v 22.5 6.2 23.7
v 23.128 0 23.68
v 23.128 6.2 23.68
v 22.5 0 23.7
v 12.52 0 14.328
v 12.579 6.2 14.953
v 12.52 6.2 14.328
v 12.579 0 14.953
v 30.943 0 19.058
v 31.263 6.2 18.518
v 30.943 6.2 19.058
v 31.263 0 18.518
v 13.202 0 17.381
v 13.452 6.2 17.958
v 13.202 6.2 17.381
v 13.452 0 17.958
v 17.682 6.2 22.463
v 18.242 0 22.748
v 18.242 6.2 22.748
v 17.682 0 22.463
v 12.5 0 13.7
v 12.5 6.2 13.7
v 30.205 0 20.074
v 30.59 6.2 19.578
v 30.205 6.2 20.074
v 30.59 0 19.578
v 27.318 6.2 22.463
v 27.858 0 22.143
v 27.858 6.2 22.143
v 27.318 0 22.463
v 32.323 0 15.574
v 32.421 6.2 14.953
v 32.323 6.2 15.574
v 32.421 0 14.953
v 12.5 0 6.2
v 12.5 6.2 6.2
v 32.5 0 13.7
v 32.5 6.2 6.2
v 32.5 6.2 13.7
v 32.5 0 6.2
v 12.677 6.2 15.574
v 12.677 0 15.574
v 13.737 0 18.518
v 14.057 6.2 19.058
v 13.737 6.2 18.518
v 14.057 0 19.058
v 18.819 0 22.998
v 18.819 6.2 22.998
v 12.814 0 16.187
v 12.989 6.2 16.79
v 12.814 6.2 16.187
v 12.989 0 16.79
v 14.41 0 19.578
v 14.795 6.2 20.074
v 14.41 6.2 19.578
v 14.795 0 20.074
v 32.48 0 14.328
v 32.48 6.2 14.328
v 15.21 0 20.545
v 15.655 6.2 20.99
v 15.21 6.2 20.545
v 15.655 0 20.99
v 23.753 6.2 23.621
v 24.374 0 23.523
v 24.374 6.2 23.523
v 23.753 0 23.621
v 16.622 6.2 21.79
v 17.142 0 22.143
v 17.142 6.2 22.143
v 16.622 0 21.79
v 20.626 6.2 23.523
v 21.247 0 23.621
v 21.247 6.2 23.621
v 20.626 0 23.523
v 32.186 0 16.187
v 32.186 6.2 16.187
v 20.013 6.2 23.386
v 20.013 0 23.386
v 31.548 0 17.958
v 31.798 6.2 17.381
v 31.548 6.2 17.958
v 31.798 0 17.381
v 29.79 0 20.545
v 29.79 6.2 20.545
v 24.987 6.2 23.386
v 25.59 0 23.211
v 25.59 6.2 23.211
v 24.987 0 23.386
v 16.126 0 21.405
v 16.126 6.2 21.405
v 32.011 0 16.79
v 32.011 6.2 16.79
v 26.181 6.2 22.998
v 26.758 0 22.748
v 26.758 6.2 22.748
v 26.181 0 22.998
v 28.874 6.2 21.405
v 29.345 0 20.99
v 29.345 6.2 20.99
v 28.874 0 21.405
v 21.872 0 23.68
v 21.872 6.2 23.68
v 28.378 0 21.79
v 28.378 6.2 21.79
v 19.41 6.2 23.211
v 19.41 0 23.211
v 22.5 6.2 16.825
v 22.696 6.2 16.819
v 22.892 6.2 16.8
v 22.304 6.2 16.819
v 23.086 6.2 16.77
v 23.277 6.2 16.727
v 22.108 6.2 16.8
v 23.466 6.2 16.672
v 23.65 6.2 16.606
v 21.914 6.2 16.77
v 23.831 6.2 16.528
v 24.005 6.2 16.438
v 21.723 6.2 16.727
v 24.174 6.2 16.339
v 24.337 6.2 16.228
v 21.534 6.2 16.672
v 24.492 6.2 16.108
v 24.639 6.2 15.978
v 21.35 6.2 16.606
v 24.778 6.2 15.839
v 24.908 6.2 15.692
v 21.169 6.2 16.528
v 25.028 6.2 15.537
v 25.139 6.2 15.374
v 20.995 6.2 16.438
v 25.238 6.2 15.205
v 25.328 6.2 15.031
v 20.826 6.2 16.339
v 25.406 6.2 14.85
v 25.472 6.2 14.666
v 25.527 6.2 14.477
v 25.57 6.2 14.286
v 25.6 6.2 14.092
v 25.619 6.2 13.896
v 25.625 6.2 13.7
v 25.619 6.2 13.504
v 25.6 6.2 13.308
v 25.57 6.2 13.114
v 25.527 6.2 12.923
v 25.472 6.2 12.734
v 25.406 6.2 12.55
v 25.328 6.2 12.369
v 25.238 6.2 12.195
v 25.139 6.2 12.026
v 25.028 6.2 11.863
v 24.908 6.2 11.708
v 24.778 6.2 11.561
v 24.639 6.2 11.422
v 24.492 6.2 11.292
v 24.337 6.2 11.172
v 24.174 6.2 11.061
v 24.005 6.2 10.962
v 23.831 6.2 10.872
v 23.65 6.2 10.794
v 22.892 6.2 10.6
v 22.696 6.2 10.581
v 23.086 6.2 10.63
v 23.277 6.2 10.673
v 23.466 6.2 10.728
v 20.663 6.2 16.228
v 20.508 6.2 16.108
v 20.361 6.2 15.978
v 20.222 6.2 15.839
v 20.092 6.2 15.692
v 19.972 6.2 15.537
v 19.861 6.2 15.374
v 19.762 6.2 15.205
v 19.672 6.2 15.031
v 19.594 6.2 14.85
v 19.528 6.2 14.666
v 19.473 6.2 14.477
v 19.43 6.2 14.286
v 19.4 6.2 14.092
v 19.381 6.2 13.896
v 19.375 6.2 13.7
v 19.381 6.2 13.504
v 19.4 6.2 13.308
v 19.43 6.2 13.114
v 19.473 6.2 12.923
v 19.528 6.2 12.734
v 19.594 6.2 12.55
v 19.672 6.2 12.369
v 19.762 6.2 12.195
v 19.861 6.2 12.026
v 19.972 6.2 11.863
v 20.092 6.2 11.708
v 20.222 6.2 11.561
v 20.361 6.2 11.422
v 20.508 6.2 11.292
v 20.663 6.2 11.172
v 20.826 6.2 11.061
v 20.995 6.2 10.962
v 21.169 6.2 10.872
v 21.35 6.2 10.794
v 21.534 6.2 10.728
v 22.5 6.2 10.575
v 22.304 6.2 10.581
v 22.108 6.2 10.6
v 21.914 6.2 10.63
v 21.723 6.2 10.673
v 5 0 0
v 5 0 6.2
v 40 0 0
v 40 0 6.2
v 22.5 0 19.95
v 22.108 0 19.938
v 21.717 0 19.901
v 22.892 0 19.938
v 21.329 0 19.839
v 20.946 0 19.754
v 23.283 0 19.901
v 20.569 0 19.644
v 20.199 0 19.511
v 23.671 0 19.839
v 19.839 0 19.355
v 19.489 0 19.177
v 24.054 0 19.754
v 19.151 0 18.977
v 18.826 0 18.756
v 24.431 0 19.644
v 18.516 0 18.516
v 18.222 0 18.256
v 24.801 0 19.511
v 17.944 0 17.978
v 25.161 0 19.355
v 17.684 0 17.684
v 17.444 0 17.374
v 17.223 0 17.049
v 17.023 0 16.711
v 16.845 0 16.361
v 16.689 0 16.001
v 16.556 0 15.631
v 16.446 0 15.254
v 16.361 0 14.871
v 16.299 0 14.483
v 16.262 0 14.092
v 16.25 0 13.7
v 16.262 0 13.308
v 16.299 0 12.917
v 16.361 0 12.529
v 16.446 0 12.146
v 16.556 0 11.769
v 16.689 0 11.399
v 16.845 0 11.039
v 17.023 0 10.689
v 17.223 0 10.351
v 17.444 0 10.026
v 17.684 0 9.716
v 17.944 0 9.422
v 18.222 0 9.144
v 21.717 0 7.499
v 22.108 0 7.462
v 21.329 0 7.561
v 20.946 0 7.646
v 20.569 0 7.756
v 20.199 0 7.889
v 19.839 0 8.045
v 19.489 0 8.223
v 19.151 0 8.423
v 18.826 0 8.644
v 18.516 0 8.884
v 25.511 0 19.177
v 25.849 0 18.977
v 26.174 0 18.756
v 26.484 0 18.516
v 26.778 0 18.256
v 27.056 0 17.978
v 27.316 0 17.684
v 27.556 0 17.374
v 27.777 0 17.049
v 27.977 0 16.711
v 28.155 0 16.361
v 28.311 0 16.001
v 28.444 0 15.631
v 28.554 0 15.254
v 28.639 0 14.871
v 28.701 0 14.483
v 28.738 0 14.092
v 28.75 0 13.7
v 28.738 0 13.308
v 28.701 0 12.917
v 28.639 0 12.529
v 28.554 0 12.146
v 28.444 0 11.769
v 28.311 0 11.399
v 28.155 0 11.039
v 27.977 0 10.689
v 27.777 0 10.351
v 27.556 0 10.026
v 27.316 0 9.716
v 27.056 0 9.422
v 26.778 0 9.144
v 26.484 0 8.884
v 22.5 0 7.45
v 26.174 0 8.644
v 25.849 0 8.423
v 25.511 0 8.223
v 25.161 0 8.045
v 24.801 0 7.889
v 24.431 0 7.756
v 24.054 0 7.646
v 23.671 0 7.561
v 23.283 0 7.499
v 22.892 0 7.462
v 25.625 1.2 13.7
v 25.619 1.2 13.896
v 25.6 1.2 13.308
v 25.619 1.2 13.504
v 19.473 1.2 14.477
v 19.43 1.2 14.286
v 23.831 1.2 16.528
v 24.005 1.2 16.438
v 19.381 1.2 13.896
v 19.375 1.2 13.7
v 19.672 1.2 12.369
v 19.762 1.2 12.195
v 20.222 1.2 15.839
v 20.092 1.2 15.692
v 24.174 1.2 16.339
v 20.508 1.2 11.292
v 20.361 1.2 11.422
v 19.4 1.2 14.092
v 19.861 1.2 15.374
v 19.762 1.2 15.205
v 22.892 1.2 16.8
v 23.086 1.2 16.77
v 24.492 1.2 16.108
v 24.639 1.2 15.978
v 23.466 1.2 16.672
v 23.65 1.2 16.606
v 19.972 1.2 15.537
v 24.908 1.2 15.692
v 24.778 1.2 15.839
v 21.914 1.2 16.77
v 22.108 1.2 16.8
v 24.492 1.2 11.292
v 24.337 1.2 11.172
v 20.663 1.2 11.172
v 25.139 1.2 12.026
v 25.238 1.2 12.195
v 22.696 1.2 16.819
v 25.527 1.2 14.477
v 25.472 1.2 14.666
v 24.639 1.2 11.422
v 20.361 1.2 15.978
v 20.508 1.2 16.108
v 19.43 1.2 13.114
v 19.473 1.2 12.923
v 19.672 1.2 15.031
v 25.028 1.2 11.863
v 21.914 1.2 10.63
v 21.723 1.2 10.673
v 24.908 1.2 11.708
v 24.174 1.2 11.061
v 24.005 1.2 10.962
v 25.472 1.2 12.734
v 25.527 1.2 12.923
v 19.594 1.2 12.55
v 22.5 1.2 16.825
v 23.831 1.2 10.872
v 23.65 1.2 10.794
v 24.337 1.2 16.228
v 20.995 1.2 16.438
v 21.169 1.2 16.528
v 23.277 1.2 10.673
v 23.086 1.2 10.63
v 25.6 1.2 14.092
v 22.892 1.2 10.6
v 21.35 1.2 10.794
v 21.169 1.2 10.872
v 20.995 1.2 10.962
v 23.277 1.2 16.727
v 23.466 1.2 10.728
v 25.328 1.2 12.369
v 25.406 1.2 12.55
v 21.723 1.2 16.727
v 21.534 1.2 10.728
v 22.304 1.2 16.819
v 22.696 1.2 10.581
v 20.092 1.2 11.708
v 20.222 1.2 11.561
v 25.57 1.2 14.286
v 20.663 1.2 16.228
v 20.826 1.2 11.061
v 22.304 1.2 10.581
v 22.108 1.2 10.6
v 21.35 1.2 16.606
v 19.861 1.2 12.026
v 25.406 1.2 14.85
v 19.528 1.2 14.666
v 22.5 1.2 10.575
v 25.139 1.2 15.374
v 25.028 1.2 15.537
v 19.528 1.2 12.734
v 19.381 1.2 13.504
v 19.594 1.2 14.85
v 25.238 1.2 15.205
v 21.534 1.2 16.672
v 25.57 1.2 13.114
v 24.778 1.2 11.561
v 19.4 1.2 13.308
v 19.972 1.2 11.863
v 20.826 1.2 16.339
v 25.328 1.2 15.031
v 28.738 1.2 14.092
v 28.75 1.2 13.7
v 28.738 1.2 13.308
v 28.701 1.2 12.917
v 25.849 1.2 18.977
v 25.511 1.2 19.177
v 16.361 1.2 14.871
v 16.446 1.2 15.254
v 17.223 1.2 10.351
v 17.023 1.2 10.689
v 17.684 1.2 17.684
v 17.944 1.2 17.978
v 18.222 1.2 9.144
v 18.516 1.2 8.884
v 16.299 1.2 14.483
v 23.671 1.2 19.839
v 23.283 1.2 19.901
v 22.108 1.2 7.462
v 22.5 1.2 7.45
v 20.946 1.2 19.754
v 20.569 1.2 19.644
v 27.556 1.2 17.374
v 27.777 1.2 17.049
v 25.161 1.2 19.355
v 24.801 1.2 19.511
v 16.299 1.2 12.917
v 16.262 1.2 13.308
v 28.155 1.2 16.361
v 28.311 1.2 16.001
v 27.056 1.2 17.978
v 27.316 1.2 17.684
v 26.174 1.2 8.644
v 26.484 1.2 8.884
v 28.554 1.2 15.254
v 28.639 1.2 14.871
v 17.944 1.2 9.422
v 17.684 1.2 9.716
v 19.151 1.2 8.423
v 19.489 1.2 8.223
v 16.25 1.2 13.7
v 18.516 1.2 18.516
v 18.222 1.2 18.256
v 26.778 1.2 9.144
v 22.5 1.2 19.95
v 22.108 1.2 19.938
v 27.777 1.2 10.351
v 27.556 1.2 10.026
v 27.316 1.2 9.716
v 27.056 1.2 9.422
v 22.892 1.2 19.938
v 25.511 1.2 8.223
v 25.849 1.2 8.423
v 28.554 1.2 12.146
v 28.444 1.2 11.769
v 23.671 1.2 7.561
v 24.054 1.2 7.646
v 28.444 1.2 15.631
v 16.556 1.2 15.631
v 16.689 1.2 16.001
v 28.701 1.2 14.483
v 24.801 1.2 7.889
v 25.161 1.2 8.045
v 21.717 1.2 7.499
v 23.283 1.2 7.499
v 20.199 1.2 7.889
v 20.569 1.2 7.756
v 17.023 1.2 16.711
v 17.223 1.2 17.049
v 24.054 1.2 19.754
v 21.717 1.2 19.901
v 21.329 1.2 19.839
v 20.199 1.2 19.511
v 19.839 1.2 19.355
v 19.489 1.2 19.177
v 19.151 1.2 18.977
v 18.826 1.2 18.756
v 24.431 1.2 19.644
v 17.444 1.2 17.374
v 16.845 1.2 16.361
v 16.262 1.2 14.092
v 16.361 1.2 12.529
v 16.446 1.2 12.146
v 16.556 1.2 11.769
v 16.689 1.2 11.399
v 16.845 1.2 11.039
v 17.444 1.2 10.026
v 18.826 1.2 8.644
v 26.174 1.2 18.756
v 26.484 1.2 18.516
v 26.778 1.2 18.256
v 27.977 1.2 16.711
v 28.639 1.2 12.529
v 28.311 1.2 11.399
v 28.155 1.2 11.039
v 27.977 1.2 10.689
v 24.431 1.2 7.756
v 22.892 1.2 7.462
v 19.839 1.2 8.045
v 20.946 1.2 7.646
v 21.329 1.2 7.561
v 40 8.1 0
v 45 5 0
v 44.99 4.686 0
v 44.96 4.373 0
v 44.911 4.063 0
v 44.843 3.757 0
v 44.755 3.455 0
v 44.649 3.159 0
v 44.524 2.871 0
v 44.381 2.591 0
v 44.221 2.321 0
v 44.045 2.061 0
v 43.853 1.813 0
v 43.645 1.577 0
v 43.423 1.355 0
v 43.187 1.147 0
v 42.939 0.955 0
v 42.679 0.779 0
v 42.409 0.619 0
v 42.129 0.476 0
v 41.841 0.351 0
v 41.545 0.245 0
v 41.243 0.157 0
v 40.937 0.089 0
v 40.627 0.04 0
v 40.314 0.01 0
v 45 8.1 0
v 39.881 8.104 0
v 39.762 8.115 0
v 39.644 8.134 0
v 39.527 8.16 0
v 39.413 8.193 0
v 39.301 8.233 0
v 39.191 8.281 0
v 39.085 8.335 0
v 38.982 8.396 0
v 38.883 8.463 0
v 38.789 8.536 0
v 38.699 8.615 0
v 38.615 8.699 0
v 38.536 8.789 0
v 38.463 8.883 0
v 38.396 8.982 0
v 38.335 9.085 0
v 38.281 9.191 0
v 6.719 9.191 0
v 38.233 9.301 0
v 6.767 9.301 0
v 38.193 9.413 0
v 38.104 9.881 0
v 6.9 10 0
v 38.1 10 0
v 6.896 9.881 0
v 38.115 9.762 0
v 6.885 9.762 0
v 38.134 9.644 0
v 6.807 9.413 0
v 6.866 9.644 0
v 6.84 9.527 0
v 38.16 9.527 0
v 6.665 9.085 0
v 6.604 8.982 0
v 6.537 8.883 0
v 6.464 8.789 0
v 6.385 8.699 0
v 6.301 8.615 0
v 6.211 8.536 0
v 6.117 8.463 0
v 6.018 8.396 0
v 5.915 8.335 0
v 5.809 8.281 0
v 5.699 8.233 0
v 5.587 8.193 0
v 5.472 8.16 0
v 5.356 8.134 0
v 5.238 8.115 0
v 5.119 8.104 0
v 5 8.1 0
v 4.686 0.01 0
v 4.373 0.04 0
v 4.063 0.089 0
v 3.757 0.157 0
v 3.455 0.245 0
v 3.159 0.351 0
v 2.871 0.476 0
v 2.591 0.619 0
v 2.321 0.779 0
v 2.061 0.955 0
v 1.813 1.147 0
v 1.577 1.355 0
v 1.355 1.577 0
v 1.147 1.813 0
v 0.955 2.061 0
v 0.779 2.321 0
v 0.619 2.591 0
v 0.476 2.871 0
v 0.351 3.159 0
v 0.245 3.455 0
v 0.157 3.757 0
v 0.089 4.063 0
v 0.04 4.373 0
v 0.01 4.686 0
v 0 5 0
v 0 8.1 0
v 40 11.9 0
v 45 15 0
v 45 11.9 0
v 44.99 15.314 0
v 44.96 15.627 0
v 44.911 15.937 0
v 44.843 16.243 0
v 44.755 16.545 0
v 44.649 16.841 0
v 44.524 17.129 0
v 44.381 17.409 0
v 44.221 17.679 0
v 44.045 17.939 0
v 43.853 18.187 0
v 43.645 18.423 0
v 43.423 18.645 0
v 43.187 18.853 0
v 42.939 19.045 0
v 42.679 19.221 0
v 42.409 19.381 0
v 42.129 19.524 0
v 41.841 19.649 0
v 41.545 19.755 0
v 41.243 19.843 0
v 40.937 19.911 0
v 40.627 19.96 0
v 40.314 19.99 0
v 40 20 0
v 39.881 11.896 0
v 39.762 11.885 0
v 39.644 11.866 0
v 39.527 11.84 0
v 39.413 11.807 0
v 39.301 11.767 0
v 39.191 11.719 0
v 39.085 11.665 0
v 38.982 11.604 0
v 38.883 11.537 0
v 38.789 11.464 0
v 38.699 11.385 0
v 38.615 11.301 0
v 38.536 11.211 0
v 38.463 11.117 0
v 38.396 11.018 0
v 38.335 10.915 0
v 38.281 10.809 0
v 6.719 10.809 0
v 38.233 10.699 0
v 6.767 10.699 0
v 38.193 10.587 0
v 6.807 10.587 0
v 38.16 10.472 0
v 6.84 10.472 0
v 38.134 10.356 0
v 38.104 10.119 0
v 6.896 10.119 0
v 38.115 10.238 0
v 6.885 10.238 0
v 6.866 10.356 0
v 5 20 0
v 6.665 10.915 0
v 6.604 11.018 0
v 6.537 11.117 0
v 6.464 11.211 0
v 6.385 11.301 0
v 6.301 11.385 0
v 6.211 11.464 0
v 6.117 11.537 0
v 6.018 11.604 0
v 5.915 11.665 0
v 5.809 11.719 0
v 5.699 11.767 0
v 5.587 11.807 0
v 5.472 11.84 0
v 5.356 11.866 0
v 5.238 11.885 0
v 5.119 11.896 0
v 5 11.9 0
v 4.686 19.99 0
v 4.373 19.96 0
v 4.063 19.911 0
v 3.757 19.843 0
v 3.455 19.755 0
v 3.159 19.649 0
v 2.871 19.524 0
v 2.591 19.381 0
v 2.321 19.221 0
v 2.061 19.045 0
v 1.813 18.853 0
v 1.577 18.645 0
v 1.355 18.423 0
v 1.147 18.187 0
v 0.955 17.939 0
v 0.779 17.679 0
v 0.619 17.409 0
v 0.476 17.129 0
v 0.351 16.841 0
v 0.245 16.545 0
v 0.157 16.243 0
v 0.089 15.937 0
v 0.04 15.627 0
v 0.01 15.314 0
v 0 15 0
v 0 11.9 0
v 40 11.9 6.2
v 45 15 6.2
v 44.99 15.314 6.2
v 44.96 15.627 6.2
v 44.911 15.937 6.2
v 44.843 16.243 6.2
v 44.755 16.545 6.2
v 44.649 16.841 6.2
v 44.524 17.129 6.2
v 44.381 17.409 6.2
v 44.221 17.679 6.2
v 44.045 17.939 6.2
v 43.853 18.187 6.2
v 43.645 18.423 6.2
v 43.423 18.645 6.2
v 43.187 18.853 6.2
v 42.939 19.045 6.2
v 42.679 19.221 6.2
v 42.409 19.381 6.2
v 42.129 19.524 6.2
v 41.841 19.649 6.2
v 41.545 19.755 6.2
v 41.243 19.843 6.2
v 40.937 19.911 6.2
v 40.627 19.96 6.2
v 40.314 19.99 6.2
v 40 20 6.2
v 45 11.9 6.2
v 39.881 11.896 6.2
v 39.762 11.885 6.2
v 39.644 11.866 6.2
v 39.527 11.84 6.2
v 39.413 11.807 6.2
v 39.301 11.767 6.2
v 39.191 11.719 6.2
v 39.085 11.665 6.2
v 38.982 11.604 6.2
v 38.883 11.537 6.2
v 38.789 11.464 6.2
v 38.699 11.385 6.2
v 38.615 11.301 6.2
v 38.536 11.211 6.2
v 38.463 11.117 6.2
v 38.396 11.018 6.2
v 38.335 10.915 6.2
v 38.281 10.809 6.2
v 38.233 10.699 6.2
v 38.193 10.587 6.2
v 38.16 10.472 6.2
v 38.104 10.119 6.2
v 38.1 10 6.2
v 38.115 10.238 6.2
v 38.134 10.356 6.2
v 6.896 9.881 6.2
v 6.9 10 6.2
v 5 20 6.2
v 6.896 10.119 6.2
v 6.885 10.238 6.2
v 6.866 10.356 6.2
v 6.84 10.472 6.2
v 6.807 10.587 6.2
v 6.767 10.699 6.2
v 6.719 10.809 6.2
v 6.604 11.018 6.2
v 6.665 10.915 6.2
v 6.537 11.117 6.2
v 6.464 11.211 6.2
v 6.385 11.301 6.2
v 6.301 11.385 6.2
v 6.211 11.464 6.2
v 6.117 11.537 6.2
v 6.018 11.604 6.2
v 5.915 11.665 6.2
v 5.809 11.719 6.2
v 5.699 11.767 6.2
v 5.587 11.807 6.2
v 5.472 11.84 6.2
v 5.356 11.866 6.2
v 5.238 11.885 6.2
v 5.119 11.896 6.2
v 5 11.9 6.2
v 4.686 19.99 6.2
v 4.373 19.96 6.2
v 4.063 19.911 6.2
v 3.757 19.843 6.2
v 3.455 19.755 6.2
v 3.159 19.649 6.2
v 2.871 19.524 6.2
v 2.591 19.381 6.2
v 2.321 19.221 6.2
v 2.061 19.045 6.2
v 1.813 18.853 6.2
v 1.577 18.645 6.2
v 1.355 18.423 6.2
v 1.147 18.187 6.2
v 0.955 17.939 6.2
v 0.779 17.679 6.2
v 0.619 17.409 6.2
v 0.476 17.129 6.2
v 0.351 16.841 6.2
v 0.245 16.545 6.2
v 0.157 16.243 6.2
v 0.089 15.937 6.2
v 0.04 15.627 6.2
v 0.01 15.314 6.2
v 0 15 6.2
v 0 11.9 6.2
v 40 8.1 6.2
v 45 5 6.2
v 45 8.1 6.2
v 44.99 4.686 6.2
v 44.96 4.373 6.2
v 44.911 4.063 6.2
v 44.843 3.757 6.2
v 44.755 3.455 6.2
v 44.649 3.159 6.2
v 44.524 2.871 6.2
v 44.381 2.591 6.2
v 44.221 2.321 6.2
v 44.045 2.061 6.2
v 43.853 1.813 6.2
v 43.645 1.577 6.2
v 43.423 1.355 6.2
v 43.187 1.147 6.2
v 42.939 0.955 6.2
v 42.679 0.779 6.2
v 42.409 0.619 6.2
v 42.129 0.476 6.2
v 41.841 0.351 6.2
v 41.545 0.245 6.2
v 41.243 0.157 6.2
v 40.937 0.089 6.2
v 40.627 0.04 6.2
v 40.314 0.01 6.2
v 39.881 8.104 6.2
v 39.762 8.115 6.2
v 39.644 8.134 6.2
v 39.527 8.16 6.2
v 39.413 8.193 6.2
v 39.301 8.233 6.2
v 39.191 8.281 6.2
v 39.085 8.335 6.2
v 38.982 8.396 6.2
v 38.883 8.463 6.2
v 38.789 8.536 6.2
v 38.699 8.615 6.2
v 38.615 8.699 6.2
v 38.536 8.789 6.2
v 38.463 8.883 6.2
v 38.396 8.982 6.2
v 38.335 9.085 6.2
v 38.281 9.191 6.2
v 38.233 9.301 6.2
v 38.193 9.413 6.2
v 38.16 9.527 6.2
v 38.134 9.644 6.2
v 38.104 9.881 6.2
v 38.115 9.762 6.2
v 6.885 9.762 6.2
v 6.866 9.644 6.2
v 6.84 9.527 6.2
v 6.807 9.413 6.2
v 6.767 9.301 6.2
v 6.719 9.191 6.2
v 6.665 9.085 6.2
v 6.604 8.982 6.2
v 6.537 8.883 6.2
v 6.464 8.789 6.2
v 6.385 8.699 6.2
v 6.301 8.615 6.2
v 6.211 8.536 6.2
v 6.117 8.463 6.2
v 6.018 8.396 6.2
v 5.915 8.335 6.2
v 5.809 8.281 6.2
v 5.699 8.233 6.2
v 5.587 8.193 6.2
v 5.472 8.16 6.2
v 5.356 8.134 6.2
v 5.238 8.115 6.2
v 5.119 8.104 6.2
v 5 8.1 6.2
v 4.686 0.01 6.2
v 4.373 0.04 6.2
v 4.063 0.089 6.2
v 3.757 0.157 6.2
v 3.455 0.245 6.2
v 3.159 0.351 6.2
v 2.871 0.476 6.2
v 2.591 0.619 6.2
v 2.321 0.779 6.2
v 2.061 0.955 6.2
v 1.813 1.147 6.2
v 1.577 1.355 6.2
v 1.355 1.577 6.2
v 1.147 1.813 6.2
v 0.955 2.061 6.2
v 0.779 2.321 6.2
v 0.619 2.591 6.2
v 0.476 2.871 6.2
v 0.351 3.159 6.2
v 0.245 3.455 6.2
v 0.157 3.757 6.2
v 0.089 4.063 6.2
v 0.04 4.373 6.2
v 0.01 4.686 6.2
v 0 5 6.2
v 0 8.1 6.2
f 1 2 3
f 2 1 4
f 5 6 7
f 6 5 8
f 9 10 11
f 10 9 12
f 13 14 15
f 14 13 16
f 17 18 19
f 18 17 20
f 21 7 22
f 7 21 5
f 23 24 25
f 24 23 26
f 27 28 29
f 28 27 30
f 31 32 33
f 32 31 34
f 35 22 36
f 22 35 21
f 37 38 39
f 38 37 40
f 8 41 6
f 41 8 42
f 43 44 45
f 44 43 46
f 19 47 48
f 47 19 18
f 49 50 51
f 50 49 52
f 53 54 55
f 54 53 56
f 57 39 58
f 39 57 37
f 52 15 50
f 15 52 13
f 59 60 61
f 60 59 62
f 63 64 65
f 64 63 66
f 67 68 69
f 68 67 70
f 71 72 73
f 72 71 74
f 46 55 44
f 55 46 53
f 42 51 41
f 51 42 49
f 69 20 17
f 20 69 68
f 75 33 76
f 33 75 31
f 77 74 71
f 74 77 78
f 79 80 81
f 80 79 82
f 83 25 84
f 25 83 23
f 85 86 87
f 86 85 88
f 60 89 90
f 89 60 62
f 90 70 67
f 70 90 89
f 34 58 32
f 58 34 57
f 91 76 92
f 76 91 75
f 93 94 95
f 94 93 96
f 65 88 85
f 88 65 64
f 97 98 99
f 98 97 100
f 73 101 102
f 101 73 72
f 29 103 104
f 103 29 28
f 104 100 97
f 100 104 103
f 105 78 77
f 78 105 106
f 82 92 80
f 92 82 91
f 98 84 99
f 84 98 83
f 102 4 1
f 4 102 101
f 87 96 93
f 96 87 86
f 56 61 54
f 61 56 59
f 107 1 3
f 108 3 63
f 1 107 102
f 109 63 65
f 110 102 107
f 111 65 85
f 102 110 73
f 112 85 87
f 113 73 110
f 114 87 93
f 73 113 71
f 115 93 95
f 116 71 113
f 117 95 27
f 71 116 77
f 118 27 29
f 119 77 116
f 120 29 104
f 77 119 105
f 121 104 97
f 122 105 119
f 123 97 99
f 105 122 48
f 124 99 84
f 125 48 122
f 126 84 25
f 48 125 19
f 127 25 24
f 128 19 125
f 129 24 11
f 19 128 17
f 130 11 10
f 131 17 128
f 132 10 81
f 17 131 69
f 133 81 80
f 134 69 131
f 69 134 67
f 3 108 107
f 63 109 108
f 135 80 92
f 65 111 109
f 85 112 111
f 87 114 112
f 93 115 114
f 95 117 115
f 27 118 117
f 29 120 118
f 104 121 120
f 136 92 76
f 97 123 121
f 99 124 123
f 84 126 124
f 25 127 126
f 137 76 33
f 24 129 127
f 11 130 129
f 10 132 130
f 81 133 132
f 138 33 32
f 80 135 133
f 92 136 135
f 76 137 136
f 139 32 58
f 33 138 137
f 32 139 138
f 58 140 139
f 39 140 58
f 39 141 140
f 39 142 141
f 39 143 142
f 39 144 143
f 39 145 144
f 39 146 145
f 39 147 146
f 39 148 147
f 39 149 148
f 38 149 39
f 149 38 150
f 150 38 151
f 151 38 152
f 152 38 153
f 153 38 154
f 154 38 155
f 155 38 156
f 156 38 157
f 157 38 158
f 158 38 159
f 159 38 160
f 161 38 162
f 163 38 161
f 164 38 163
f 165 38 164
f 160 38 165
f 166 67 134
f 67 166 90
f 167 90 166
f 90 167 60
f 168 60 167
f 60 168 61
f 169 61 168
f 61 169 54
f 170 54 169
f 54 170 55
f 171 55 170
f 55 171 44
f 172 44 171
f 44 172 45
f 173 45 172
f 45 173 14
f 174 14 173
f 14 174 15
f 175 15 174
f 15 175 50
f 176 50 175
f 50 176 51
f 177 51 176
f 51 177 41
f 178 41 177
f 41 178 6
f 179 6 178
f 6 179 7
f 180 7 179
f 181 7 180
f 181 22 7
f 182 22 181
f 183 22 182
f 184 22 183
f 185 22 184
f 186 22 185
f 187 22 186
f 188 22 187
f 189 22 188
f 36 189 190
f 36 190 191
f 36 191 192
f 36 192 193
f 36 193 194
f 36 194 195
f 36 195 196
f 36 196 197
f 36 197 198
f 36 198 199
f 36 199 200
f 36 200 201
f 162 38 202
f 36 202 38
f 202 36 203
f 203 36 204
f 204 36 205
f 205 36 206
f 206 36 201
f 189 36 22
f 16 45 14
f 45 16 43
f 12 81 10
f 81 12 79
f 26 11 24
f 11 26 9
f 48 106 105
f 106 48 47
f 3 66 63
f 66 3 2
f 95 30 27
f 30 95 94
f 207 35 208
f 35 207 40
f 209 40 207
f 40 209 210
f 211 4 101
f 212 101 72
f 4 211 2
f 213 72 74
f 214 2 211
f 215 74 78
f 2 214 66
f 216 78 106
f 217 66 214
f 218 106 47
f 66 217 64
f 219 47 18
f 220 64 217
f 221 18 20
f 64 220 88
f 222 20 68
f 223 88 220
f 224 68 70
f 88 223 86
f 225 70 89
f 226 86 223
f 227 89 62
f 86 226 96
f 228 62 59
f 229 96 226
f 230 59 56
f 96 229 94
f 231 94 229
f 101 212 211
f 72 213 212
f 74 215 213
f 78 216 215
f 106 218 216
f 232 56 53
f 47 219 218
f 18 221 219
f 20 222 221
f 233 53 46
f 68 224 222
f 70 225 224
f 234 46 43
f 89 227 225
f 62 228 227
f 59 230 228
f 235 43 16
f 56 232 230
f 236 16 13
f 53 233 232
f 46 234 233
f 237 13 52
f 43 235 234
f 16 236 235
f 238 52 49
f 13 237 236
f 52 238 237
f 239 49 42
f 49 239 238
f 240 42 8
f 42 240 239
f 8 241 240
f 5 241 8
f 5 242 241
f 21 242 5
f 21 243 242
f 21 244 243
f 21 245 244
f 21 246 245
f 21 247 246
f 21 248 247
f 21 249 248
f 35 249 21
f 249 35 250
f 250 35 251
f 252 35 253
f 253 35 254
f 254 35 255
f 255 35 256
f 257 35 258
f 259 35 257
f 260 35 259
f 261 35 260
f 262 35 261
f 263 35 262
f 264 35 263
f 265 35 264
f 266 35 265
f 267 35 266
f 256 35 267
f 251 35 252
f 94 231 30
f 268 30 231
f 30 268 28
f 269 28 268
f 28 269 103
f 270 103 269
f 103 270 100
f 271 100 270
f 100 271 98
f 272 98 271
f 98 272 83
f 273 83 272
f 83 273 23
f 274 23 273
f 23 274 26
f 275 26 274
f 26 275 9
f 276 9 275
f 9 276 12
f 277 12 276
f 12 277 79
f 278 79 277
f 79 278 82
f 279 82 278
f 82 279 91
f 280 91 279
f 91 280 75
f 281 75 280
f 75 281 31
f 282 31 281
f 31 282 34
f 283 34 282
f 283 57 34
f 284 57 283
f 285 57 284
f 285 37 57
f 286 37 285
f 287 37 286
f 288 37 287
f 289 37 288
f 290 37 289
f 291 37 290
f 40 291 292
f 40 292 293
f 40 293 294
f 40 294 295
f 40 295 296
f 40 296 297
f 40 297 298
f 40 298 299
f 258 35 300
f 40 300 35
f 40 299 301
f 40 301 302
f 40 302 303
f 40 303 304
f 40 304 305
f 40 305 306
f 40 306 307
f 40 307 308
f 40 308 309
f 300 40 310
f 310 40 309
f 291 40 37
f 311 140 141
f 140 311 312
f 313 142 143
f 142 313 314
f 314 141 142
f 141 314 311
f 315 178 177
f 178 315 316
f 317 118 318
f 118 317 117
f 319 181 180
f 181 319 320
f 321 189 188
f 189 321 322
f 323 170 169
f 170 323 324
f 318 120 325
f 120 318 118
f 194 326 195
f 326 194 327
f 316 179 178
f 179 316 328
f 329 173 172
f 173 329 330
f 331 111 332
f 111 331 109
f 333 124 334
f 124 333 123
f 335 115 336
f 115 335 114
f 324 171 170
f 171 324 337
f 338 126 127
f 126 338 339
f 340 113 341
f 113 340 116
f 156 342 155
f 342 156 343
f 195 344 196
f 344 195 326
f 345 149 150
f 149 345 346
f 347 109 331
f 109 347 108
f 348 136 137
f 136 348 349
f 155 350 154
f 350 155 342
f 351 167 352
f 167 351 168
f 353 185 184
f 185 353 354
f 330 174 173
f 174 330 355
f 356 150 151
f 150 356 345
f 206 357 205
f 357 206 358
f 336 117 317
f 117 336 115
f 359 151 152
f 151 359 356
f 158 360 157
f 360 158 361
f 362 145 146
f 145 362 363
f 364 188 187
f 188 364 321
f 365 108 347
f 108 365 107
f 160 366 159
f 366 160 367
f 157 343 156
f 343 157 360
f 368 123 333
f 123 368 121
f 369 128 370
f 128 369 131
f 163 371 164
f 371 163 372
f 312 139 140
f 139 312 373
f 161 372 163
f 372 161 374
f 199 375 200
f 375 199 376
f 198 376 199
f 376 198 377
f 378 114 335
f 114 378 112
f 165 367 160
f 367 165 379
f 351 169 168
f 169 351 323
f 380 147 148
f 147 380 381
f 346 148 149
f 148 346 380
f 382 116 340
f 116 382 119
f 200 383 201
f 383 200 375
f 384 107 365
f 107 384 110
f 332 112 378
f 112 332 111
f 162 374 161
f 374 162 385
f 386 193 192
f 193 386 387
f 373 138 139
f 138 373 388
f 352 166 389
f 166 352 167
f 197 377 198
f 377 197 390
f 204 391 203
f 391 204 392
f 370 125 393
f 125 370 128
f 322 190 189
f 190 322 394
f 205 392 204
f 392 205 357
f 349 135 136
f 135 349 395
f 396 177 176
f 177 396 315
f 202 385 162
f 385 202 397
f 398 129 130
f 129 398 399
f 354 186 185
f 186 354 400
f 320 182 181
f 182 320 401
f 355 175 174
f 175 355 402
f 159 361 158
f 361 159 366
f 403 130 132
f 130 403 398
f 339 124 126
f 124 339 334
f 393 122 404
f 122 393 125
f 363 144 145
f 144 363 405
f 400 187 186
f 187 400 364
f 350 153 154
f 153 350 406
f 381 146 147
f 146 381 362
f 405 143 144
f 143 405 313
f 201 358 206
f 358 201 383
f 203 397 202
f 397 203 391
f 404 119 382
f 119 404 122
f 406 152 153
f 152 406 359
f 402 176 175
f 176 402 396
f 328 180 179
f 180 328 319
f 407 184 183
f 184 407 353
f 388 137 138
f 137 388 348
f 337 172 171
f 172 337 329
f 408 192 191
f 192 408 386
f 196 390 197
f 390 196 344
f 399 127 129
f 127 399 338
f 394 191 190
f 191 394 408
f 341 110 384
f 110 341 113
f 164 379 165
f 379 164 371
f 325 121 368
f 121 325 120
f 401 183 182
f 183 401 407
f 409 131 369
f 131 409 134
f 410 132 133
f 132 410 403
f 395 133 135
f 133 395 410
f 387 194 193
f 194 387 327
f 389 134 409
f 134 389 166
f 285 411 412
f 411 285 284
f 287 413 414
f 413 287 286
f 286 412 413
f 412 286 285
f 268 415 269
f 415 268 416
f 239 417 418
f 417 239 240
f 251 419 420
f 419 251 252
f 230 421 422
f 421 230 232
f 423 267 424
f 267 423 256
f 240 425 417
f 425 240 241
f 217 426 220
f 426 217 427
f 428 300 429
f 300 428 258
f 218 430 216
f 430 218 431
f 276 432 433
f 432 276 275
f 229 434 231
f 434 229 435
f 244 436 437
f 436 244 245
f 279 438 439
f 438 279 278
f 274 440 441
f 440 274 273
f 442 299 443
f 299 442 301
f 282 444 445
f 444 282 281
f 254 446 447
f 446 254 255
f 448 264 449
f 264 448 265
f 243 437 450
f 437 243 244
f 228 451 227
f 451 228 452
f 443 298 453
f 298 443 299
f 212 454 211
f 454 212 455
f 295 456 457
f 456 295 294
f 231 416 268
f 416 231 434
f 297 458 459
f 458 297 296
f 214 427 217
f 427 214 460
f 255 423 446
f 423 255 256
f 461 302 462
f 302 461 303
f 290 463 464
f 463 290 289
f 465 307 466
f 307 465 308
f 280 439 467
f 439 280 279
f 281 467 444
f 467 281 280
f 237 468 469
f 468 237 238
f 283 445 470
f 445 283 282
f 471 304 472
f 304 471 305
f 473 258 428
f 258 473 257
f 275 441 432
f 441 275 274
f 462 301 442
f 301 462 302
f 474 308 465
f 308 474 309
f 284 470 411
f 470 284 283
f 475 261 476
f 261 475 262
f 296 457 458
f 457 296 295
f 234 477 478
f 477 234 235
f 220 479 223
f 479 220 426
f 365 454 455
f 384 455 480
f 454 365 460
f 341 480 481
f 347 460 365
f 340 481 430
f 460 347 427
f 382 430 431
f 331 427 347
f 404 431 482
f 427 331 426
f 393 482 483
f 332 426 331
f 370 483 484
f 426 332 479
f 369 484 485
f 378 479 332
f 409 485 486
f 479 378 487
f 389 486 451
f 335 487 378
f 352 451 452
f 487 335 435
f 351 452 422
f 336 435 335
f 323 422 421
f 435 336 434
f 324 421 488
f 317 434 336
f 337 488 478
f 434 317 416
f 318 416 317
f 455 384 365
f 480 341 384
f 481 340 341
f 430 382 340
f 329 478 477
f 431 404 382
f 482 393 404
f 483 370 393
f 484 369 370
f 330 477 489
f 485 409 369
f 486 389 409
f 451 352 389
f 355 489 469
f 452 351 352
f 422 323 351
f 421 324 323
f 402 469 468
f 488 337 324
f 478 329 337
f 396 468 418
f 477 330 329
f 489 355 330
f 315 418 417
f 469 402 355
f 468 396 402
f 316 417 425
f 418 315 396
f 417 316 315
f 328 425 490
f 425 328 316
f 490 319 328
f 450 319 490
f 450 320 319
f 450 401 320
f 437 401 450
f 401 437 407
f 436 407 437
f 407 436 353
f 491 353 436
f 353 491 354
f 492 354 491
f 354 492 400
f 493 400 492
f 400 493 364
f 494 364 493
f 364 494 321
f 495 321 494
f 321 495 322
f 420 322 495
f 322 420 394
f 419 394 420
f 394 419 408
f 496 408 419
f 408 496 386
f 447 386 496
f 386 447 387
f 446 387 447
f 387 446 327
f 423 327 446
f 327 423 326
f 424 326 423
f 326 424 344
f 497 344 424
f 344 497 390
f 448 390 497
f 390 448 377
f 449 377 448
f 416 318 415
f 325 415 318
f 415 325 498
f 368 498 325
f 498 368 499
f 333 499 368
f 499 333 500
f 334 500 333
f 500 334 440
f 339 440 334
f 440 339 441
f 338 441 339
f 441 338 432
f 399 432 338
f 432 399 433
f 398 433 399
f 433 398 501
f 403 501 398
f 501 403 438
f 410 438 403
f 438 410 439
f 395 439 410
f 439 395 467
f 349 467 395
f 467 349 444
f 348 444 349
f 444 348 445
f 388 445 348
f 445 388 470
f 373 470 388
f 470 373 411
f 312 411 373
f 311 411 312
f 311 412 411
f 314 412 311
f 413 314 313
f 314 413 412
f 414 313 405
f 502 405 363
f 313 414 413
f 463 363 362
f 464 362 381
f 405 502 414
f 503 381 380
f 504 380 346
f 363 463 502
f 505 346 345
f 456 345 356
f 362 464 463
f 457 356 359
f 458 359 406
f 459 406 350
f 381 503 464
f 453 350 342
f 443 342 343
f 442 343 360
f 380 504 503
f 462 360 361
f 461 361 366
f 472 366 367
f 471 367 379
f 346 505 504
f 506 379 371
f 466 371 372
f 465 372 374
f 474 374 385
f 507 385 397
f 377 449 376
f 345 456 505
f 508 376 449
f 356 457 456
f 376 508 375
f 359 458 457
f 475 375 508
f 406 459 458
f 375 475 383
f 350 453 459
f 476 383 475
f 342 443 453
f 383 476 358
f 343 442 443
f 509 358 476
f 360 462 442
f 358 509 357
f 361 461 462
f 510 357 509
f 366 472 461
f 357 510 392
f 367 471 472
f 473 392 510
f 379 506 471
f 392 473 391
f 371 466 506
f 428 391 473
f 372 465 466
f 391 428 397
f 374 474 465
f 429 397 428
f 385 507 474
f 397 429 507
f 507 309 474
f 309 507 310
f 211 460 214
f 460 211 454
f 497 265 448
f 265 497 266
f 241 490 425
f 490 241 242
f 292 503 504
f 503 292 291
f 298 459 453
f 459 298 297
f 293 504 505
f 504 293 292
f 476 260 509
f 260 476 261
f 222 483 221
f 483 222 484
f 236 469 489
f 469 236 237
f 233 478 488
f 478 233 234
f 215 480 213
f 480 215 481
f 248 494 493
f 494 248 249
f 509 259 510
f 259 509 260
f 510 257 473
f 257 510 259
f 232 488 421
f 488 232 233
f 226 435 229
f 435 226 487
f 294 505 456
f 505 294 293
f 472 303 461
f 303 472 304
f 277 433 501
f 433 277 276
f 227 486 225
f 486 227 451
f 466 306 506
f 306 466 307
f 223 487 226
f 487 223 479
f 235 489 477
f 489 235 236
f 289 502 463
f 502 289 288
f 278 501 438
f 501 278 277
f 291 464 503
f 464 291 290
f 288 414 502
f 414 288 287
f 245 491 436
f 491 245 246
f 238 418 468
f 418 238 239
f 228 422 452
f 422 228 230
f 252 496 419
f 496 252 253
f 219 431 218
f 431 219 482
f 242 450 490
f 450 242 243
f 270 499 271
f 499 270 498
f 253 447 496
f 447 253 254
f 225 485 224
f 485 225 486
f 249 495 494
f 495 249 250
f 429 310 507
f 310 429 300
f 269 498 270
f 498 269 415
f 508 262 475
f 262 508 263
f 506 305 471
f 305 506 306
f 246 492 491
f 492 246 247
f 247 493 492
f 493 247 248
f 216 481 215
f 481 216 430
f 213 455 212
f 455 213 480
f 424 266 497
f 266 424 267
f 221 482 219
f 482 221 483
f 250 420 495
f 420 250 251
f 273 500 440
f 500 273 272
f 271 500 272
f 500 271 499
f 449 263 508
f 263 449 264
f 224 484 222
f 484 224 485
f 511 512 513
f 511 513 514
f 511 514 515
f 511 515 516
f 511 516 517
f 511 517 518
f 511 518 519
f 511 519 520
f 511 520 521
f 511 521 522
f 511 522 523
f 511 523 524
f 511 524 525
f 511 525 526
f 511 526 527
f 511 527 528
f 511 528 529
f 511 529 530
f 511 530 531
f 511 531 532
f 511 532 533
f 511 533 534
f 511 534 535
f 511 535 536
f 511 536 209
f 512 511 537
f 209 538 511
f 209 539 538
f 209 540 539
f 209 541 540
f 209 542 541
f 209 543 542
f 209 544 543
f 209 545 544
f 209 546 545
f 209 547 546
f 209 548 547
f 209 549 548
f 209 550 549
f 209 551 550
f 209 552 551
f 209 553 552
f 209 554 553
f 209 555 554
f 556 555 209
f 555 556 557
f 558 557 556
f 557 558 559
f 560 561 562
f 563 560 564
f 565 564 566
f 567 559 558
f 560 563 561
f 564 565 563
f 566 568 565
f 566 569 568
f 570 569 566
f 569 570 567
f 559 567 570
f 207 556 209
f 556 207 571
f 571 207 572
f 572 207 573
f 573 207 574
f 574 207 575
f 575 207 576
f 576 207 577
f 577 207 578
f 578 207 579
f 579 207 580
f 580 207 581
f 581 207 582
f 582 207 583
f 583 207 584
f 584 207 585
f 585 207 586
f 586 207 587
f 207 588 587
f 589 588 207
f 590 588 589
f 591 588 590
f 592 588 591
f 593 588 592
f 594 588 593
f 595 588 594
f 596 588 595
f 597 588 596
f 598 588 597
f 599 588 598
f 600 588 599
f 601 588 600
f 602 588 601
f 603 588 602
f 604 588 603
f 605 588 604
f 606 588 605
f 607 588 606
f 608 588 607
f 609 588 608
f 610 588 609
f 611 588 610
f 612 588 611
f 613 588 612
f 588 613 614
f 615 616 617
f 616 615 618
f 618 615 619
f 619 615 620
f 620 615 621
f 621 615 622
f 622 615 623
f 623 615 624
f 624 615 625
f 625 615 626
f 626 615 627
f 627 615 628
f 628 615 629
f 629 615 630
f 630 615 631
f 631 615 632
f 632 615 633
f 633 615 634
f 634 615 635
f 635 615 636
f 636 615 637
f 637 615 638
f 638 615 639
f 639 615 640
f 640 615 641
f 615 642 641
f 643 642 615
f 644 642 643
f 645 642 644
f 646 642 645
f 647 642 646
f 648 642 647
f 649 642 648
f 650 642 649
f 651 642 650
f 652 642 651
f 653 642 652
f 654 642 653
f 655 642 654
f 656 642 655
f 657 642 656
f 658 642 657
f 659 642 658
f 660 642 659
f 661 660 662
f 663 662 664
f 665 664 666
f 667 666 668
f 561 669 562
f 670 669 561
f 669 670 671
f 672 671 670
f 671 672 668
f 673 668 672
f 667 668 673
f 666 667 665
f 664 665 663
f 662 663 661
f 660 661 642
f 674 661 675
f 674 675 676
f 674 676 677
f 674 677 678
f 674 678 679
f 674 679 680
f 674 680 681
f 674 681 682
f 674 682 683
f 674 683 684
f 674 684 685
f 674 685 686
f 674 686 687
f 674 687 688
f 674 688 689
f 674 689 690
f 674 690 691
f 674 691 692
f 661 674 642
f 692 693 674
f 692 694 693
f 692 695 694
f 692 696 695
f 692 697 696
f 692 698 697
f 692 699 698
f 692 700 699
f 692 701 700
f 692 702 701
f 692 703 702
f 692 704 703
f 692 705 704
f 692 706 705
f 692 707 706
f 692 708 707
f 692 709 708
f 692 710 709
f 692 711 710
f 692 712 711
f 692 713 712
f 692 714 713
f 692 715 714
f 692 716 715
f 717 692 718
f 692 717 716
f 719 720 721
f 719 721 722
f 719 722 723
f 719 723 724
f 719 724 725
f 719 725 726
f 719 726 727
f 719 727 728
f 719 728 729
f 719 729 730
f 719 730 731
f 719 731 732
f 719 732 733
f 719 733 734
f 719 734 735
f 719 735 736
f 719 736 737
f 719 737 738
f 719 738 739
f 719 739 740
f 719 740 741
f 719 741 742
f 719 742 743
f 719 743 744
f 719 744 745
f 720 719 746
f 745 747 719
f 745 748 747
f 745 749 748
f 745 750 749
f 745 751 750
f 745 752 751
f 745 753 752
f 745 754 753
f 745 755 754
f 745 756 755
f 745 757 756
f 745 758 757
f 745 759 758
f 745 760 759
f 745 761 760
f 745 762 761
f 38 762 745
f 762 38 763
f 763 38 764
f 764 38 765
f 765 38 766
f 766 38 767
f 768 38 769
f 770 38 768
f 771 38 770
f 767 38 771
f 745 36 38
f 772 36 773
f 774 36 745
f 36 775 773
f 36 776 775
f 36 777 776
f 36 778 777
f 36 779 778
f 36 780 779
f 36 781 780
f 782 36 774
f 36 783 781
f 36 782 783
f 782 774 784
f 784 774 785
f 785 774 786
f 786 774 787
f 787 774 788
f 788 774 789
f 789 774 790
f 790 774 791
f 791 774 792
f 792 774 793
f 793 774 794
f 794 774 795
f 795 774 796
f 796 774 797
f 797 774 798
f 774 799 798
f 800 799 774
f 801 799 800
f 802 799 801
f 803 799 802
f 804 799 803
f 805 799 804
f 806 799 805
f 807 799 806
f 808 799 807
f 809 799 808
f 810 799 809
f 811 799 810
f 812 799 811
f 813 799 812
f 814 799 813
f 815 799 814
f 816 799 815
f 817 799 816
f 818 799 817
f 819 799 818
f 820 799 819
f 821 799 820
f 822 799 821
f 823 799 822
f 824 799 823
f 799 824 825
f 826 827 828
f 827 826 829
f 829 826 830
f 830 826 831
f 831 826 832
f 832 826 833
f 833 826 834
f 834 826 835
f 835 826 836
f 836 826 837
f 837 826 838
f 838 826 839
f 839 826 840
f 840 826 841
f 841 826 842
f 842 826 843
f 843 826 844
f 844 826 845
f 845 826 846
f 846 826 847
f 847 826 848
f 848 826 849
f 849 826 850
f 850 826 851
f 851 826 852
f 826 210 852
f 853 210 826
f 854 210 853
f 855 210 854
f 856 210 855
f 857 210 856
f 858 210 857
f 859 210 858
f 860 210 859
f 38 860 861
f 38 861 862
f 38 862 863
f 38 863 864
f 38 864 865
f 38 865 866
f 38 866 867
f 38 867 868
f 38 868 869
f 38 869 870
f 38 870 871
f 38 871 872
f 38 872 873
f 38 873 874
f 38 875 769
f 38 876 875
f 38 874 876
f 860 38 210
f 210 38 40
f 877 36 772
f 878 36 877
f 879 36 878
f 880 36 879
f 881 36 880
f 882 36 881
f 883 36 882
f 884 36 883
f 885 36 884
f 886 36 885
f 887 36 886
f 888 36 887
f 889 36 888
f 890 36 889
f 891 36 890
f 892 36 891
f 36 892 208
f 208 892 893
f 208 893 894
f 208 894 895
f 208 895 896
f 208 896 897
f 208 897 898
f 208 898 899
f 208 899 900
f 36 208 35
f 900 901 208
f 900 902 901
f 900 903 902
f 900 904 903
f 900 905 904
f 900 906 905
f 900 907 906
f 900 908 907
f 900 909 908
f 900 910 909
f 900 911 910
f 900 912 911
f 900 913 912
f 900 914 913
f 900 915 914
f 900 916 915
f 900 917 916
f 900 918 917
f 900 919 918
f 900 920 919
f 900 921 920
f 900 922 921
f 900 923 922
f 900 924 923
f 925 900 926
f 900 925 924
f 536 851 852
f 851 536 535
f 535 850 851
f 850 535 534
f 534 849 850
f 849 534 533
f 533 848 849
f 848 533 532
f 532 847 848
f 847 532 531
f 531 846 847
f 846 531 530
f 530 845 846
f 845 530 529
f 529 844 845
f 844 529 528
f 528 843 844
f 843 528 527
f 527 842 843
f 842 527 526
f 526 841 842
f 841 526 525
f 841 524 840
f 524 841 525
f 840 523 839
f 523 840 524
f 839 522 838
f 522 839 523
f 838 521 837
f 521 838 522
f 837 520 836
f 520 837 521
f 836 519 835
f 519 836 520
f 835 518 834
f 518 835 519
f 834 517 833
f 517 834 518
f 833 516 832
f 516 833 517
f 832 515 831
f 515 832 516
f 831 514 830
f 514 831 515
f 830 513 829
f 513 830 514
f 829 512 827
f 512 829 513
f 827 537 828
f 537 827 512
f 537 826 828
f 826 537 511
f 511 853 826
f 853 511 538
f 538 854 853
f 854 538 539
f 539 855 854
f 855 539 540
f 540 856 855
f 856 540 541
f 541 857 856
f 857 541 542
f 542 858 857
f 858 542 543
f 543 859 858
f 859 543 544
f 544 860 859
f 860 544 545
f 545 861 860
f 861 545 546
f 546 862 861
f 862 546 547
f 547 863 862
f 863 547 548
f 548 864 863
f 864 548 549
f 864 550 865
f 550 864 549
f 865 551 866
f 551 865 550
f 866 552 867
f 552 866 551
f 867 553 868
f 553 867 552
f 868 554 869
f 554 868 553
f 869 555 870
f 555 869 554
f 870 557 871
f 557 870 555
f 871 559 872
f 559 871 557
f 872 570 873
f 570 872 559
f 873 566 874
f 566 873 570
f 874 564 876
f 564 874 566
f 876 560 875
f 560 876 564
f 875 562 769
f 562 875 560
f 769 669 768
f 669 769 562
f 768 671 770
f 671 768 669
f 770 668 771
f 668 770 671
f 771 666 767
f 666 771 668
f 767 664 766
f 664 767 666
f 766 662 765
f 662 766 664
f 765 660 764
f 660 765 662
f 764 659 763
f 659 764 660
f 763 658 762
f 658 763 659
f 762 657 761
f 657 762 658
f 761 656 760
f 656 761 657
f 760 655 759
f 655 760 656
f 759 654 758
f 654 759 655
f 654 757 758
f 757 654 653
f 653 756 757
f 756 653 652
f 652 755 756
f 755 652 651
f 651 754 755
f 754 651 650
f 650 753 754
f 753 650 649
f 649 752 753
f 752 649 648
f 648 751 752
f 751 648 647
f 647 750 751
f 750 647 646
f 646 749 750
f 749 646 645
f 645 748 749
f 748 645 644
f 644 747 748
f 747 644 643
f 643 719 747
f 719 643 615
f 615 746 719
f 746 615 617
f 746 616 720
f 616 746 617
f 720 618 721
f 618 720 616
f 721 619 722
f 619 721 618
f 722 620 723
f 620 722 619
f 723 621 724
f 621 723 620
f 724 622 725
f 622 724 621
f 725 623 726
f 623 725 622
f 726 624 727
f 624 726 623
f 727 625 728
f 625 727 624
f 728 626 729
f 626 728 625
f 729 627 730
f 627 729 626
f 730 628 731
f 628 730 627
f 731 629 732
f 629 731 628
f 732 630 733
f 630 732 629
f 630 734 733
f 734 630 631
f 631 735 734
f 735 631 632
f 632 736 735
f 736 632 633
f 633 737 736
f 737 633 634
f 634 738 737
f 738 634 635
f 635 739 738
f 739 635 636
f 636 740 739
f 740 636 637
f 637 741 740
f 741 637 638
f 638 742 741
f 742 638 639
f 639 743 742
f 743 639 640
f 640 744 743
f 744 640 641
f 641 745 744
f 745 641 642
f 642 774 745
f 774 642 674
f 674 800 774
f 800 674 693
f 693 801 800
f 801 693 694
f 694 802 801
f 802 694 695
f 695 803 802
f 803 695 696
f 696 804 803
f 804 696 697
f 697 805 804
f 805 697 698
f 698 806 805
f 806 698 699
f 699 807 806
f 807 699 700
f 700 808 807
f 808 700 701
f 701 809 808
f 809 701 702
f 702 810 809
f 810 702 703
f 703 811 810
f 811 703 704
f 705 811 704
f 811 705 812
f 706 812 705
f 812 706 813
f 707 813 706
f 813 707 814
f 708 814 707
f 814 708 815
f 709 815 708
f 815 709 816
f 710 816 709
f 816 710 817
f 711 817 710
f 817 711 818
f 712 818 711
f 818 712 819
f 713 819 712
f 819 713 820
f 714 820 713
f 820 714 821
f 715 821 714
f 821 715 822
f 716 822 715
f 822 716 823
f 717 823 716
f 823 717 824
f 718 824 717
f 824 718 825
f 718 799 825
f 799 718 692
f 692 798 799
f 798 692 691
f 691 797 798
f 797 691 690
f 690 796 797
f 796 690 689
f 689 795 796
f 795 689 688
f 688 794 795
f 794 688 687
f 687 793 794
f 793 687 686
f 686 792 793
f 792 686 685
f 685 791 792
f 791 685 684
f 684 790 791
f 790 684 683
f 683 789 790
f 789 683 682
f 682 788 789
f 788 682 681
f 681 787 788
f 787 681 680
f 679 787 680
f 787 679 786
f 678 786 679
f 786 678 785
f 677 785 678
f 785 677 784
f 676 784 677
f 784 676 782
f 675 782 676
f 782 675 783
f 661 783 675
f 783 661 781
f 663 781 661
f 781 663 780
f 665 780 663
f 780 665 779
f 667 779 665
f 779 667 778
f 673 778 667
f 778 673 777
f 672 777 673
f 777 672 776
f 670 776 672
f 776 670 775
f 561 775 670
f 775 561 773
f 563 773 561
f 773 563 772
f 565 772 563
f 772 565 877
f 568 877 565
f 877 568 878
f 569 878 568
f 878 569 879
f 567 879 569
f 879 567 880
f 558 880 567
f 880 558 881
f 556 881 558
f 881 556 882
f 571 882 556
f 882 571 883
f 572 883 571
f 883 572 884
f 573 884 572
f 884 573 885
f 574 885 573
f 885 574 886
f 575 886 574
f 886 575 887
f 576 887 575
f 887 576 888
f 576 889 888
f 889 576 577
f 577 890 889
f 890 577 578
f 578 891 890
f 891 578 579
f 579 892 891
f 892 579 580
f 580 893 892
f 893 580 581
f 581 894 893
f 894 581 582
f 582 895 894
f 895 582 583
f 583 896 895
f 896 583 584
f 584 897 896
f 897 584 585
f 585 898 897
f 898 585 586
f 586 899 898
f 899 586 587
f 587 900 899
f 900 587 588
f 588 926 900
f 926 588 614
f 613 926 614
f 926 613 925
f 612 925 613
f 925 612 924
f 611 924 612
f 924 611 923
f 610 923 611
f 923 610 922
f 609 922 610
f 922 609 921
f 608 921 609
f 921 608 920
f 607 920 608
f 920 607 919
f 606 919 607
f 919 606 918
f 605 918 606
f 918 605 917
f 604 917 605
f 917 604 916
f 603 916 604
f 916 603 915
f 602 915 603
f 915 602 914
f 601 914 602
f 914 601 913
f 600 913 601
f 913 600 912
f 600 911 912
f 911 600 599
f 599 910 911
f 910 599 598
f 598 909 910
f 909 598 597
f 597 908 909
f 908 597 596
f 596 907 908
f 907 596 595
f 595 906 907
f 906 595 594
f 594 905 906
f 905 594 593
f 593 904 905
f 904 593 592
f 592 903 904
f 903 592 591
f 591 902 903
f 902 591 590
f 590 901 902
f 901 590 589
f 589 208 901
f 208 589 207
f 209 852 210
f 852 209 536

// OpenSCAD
$fn = 100;
scale([10,10,10]) {
    linear_extrude(.62)
    difference() {
        translate([.5,.5])
        hull() {
            for(j=[0:1]) {
                for(i=[0:1]) {
                    translate([i*(4.5-1), j*(2-1)])
                    circle(r=.5);
                }
            }
        }
        hull() {
            translate([.5,1])
            circle(d=.38);
            translate([0,1])
            square(.38, center=true);
        }

        hull() {
            translate([4.5-.5,1])
            circle(d=.38);
            translate([4.5,1])
            square(.38, center=true);
        }
    }
    
    translate([2.25,0,.62+.75])
    rotate([-90,0,0])
    difference() {
        linear_extrude(.62)
        hull() {
            circle(r=1);
            translate([-1,0])
            square([2, .75]);
        }
        translate([0,0,-0.1])
        cylinder(d=.625, h=.625+.2);

        translate([0,0,-0.1])
        cylinder(d=1.25, h=.12+.1);
    }
}
